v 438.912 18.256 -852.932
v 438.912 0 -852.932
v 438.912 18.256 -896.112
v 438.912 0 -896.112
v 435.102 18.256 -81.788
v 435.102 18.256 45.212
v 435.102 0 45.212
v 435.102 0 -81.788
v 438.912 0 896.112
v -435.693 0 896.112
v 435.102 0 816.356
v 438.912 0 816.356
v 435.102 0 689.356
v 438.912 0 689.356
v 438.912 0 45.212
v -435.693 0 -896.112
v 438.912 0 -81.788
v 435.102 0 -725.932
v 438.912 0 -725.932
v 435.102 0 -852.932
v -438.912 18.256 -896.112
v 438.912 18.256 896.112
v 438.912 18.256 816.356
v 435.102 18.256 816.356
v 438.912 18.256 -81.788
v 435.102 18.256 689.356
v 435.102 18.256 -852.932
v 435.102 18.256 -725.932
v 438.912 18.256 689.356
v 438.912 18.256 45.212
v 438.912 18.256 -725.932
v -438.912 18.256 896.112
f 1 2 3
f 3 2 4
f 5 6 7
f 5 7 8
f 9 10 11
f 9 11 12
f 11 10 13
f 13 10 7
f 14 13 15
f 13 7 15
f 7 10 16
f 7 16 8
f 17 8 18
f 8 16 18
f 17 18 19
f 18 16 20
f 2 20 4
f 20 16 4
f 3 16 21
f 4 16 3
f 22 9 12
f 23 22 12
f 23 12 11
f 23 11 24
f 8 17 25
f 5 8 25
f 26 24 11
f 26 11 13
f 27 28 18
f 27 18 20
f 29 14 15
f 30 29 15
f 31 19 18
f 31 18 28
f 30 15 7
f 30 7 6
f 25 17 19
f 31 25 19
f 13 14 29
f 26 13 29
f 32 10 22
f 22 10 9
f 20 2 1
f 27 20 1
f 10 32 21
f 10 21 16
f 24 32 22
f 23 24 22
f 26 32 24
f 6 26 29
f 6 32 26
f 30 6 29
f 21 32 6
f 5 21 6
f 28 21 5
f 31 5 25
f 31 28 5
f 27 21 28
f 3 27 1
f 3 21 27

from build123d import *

# Parameters (mm, degrees)
SKETCH1_W           = 877.824
SKETCH1_H           = 1792.224
BOSS_EXTRUDE1_DEPTH = 18.25625
SKETCH2_W           = 127
SKETCH2_H           = 18.25625
CUT_EXTRUDE1_DEPTH  = 3.81
CUT_EXTRUDE2_DEPTH  = 7620


with BuildPart() as part:
    # Sketch1 → Boss-Extrude1 (new body)
    with BuildSketch(Plane(origin=(0, 0, 0), x_dir=(1, 0, 0), z_dir=(0, 1, 0))):
        Rectangle(SKETCH1_W, SKETCH1_H)
    extrude(amount=BOSS_EXTRUDE1_DEPTH)

    # Sketch2 → Cut-Extrude1 (cut)
    with BuildSketch(Plane(origin=(438.912, 0, 0), x_dir=(0, 0, -1), z_dir=(1, 0, 0))):
        with Locations((-752.856, 9.128125)):
            Rectangle(SKETCH2_W, SKETCH2_H)
        with Locations((18.288, 9.128125)):
            Rectangle(SKETCH2_W, SKETCH2_H)
        with Locations((789.432, 9.128125)):
            Rectangle(SKETCH2_W, SKETCH2_H)
    extrude(amount=-CUT_EXTRUDE1_DEPTH, mode=Mode.SUBTRACT)

    # Sketch3 → Cut-Extrude2 (cut)
    with BuildSketch(Plane(origin=(-438.912, 0, 896.112), x_dir=(1, 0, 0), z_dir=(0, 0, 1))):
        Polygon((0, 18.25625), (3.219069442, 0), (0, 0), align=None)
    extrude(amount=-CUT_EXTRUDE2_DEPTH, mode=Mode.SUBTRACT)


solid = part.part
